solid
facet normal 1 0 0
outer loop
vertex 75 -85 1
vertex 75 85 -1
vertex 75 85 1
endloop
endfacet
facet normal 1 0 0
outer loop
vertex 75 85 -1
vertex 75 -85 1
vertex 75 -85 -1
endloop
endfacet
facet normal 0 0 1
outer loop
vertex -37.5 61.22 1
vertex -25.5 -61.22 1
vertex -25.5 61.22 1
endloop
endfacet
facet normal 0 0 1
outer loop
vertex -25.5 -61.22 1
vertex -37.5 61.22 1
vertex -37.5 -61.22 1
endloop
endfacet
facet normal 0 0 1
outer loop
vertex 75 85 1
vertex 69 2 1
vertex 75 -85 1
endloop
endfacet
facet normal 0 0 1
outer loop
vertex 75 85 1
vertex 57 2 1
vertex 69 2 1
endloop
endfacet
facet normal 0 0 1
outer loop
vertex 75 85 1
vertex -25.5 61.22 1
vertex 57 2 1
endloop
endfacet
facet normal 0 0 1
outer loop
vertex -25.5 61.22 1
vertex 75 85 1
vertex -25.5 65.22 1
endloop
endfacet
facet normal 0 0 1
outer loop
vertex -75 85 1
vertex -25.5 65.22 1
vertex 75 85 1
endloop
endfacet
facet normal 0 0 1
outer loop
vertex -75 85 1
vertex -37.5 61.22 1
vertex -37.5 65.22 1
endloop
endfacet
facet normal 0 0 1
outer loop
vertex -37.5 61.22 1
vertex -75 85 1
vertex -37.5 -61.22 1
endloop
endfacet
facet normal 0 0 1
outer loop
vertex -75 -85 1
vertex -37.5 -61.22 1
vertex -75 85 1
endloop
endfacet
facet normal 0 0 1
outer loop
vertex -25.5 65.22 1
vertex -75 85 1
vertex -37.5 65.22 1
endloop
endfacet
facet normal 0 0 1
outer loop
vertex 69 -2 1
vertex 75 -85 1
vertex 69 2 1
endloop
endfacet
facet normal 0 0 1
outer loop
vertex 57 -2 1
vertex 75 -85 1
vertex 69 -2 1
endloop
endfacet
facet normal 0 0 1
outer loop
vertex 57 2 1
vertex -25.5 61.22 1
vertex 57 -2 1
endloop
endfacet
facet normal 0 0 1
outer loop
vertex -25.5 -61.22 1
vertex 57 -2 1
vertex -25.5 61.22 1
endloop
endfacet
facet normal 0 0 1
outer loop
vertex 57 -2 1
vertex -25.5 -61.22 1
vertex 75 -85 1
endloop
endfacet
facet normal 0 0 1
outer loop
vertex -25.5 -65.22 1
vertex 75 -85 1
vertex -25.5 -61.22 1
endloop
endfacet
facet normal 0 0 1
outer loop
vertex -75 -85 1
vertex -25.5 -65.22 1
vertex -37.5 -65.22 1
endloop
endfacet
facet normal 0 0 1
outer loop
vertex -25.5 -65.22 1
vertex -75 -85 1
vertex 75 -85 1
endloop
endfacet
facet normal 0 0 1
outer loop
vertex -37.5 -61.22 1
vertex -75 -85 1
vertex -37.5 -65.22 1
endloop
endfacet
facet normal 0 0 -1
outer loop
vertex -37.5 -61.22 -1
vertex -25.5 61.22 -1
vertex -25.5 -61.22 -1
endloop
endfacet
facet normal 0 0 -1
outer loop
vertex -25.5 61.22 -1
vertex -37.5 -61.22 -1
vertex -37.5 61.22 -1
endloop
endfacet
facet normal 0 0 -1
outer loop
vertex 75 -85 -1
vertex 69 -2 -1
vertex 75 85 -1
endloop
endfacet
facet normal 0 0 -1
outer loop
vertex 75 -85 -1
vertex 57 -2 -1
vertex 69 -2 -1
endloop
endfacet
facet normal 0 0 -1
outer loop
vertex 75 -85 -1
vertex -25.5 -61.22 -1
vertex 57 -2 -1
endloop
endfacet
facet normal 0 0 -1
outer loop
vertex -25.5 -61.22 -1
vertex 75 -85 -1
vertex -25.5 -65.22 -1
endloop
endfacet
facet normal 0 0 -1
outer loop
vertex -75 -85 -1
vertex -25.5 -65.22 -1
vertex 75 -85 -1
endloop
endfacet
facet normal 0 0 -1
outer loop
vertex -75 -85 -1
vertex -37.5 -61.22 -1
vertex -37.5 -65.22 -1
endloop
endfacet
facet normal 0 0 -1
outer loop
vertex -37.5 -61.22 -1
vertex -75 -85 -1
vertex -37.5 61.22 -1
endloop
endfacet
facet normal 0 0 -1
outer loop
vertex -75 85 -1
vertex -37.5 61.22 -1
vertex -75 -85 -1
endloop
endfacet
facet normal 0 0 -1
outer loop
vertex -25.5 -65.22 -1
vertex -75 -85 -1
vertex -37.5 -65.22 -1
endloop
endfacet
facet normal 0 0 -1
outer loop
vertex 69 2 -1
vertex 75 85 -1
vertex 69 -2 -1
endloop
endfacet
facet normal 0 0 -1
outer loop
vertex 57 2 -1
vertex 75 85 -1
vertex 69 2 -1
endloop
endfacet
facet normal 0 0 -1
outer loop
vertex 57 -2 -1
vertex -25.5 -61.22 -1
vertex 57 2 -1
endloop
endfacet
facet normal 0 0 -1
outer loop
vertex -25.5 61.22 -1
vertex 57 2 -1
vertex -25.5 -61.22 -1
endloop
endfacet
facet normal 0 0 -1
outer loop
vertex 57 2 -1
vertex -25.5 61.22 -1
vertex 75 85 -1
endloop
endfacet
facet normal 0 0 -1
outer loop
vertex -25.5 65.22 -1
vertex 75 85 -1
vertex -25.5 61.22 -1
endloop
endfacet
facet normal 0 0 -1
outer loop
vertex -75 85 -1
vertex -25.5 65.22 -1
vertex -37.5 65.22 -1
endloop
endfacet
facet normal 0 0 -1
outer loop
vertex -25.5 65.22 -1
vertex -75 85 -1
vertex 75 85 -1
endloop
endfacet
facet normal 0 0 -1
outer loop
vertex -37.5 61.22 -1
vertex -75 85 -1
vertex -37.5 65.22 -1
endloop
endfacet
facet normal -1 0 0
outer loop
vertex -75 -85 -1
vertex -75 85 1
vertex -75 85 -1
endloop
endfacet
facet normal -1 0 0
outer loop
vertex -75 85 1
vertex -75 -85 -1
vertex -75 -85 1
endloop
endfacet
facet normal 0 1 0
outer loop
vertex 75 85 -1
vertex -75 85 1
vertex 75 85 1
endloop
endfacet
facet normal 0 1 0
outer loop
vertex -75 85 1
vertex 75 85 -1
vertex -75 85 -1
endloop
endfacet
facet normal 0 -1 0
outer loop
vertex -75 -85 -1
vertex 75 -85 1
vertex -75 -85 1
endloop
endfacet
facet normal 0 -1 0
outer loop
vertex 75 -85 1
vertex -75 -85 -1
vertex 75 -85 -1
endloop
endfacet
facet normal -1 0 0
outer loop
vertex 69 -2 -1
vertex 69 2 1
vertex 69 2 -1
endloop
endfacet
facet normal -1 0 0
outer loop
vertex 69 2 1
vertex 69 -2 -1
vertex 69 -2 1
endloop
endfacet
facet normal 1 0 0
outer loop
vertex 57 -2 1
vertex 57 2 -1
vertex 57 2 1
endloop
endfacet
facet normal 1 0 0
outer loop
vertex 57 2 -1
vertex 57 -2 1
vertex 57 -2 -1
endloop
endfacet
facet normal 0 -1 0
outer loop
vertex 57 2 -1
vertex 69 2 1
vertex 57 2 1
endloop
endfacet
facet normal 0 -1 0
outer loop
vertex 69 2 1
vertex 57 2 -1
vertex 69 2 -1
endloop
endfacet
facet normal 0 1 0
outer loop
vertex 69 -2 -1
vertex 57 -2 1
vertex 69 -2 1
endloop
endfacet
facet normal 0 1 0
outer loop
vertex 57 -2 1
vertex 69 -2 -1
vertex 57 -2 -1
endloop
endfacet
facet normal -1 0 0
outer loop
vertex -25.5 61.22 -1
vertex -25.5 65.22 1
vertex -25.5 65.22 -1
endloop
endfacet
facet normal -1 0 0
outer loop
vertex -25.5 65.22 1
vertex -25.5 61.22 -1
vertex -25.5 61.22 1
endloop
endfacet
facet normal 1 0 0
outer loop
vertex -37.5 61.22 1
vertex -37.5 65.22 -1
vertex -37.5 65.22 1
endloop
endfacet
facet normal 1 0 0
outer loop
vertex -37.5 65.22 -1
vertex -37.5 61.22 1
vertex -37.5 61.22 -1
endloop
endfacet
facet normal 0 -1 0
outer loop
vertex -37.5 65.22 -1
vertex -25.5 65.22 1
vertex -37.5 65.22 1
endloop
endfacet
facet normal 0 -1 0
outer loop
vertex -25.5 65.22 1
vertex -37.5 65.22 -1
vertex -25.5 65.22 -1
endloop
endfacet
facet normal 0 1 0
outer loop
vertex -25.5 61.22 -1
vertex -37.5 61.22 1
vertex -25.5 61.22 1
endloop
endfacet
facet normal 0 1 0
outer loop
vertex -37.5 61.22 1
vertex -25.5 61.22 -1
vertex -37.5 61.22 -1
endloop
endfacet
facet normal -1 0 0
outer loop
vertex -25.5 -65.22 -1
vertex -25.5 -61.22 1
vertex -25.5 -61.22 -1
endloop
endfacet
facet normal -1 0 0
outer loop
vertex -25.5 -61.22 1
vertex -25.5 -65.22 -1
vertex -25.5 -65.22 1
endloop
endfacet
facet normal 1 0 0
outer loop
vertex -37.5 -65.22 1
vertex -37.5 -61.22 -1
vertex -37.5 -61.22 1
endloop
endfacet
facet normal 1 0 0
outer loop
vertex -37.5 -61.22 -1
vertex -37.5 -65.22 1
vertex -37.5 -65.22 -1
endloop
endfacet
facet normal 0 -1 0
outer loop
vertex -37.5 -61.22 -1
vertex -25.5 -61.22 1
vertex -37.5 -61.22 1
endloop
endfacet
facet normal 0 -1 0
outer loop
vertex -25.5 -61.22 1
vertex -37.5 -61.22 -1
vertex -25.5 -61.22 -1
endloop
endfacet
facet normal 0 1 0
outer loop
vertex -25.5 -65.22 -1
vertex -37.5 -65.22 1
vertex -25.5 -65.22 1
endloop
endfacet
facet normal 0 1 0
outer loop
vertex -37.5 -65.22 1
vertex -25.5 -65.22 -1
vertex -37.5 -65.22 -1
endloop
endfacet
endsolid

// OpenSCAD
// ========================================
// a 150 x 170 x 2 mm plate with three 12 x 4 mm slots
// NeuroCAD canonical IR; dimensions are millimetres
// ========================================
$fn = 48;

difference() {
  cube(size=[150, 170, 2], center=true);
  translate([63, 0, 0]) {
    cube(size=[12, 4, 4], center=true);
  }
  translate([-31.5, 63.219854476264, 0]) {
    cube(size=[12, 4, 4], center=true);
  }
  translate([-31.5, -63.219854476264, 0]) {
    cube(size=[12, 4, 4], center=true);
  }
}
